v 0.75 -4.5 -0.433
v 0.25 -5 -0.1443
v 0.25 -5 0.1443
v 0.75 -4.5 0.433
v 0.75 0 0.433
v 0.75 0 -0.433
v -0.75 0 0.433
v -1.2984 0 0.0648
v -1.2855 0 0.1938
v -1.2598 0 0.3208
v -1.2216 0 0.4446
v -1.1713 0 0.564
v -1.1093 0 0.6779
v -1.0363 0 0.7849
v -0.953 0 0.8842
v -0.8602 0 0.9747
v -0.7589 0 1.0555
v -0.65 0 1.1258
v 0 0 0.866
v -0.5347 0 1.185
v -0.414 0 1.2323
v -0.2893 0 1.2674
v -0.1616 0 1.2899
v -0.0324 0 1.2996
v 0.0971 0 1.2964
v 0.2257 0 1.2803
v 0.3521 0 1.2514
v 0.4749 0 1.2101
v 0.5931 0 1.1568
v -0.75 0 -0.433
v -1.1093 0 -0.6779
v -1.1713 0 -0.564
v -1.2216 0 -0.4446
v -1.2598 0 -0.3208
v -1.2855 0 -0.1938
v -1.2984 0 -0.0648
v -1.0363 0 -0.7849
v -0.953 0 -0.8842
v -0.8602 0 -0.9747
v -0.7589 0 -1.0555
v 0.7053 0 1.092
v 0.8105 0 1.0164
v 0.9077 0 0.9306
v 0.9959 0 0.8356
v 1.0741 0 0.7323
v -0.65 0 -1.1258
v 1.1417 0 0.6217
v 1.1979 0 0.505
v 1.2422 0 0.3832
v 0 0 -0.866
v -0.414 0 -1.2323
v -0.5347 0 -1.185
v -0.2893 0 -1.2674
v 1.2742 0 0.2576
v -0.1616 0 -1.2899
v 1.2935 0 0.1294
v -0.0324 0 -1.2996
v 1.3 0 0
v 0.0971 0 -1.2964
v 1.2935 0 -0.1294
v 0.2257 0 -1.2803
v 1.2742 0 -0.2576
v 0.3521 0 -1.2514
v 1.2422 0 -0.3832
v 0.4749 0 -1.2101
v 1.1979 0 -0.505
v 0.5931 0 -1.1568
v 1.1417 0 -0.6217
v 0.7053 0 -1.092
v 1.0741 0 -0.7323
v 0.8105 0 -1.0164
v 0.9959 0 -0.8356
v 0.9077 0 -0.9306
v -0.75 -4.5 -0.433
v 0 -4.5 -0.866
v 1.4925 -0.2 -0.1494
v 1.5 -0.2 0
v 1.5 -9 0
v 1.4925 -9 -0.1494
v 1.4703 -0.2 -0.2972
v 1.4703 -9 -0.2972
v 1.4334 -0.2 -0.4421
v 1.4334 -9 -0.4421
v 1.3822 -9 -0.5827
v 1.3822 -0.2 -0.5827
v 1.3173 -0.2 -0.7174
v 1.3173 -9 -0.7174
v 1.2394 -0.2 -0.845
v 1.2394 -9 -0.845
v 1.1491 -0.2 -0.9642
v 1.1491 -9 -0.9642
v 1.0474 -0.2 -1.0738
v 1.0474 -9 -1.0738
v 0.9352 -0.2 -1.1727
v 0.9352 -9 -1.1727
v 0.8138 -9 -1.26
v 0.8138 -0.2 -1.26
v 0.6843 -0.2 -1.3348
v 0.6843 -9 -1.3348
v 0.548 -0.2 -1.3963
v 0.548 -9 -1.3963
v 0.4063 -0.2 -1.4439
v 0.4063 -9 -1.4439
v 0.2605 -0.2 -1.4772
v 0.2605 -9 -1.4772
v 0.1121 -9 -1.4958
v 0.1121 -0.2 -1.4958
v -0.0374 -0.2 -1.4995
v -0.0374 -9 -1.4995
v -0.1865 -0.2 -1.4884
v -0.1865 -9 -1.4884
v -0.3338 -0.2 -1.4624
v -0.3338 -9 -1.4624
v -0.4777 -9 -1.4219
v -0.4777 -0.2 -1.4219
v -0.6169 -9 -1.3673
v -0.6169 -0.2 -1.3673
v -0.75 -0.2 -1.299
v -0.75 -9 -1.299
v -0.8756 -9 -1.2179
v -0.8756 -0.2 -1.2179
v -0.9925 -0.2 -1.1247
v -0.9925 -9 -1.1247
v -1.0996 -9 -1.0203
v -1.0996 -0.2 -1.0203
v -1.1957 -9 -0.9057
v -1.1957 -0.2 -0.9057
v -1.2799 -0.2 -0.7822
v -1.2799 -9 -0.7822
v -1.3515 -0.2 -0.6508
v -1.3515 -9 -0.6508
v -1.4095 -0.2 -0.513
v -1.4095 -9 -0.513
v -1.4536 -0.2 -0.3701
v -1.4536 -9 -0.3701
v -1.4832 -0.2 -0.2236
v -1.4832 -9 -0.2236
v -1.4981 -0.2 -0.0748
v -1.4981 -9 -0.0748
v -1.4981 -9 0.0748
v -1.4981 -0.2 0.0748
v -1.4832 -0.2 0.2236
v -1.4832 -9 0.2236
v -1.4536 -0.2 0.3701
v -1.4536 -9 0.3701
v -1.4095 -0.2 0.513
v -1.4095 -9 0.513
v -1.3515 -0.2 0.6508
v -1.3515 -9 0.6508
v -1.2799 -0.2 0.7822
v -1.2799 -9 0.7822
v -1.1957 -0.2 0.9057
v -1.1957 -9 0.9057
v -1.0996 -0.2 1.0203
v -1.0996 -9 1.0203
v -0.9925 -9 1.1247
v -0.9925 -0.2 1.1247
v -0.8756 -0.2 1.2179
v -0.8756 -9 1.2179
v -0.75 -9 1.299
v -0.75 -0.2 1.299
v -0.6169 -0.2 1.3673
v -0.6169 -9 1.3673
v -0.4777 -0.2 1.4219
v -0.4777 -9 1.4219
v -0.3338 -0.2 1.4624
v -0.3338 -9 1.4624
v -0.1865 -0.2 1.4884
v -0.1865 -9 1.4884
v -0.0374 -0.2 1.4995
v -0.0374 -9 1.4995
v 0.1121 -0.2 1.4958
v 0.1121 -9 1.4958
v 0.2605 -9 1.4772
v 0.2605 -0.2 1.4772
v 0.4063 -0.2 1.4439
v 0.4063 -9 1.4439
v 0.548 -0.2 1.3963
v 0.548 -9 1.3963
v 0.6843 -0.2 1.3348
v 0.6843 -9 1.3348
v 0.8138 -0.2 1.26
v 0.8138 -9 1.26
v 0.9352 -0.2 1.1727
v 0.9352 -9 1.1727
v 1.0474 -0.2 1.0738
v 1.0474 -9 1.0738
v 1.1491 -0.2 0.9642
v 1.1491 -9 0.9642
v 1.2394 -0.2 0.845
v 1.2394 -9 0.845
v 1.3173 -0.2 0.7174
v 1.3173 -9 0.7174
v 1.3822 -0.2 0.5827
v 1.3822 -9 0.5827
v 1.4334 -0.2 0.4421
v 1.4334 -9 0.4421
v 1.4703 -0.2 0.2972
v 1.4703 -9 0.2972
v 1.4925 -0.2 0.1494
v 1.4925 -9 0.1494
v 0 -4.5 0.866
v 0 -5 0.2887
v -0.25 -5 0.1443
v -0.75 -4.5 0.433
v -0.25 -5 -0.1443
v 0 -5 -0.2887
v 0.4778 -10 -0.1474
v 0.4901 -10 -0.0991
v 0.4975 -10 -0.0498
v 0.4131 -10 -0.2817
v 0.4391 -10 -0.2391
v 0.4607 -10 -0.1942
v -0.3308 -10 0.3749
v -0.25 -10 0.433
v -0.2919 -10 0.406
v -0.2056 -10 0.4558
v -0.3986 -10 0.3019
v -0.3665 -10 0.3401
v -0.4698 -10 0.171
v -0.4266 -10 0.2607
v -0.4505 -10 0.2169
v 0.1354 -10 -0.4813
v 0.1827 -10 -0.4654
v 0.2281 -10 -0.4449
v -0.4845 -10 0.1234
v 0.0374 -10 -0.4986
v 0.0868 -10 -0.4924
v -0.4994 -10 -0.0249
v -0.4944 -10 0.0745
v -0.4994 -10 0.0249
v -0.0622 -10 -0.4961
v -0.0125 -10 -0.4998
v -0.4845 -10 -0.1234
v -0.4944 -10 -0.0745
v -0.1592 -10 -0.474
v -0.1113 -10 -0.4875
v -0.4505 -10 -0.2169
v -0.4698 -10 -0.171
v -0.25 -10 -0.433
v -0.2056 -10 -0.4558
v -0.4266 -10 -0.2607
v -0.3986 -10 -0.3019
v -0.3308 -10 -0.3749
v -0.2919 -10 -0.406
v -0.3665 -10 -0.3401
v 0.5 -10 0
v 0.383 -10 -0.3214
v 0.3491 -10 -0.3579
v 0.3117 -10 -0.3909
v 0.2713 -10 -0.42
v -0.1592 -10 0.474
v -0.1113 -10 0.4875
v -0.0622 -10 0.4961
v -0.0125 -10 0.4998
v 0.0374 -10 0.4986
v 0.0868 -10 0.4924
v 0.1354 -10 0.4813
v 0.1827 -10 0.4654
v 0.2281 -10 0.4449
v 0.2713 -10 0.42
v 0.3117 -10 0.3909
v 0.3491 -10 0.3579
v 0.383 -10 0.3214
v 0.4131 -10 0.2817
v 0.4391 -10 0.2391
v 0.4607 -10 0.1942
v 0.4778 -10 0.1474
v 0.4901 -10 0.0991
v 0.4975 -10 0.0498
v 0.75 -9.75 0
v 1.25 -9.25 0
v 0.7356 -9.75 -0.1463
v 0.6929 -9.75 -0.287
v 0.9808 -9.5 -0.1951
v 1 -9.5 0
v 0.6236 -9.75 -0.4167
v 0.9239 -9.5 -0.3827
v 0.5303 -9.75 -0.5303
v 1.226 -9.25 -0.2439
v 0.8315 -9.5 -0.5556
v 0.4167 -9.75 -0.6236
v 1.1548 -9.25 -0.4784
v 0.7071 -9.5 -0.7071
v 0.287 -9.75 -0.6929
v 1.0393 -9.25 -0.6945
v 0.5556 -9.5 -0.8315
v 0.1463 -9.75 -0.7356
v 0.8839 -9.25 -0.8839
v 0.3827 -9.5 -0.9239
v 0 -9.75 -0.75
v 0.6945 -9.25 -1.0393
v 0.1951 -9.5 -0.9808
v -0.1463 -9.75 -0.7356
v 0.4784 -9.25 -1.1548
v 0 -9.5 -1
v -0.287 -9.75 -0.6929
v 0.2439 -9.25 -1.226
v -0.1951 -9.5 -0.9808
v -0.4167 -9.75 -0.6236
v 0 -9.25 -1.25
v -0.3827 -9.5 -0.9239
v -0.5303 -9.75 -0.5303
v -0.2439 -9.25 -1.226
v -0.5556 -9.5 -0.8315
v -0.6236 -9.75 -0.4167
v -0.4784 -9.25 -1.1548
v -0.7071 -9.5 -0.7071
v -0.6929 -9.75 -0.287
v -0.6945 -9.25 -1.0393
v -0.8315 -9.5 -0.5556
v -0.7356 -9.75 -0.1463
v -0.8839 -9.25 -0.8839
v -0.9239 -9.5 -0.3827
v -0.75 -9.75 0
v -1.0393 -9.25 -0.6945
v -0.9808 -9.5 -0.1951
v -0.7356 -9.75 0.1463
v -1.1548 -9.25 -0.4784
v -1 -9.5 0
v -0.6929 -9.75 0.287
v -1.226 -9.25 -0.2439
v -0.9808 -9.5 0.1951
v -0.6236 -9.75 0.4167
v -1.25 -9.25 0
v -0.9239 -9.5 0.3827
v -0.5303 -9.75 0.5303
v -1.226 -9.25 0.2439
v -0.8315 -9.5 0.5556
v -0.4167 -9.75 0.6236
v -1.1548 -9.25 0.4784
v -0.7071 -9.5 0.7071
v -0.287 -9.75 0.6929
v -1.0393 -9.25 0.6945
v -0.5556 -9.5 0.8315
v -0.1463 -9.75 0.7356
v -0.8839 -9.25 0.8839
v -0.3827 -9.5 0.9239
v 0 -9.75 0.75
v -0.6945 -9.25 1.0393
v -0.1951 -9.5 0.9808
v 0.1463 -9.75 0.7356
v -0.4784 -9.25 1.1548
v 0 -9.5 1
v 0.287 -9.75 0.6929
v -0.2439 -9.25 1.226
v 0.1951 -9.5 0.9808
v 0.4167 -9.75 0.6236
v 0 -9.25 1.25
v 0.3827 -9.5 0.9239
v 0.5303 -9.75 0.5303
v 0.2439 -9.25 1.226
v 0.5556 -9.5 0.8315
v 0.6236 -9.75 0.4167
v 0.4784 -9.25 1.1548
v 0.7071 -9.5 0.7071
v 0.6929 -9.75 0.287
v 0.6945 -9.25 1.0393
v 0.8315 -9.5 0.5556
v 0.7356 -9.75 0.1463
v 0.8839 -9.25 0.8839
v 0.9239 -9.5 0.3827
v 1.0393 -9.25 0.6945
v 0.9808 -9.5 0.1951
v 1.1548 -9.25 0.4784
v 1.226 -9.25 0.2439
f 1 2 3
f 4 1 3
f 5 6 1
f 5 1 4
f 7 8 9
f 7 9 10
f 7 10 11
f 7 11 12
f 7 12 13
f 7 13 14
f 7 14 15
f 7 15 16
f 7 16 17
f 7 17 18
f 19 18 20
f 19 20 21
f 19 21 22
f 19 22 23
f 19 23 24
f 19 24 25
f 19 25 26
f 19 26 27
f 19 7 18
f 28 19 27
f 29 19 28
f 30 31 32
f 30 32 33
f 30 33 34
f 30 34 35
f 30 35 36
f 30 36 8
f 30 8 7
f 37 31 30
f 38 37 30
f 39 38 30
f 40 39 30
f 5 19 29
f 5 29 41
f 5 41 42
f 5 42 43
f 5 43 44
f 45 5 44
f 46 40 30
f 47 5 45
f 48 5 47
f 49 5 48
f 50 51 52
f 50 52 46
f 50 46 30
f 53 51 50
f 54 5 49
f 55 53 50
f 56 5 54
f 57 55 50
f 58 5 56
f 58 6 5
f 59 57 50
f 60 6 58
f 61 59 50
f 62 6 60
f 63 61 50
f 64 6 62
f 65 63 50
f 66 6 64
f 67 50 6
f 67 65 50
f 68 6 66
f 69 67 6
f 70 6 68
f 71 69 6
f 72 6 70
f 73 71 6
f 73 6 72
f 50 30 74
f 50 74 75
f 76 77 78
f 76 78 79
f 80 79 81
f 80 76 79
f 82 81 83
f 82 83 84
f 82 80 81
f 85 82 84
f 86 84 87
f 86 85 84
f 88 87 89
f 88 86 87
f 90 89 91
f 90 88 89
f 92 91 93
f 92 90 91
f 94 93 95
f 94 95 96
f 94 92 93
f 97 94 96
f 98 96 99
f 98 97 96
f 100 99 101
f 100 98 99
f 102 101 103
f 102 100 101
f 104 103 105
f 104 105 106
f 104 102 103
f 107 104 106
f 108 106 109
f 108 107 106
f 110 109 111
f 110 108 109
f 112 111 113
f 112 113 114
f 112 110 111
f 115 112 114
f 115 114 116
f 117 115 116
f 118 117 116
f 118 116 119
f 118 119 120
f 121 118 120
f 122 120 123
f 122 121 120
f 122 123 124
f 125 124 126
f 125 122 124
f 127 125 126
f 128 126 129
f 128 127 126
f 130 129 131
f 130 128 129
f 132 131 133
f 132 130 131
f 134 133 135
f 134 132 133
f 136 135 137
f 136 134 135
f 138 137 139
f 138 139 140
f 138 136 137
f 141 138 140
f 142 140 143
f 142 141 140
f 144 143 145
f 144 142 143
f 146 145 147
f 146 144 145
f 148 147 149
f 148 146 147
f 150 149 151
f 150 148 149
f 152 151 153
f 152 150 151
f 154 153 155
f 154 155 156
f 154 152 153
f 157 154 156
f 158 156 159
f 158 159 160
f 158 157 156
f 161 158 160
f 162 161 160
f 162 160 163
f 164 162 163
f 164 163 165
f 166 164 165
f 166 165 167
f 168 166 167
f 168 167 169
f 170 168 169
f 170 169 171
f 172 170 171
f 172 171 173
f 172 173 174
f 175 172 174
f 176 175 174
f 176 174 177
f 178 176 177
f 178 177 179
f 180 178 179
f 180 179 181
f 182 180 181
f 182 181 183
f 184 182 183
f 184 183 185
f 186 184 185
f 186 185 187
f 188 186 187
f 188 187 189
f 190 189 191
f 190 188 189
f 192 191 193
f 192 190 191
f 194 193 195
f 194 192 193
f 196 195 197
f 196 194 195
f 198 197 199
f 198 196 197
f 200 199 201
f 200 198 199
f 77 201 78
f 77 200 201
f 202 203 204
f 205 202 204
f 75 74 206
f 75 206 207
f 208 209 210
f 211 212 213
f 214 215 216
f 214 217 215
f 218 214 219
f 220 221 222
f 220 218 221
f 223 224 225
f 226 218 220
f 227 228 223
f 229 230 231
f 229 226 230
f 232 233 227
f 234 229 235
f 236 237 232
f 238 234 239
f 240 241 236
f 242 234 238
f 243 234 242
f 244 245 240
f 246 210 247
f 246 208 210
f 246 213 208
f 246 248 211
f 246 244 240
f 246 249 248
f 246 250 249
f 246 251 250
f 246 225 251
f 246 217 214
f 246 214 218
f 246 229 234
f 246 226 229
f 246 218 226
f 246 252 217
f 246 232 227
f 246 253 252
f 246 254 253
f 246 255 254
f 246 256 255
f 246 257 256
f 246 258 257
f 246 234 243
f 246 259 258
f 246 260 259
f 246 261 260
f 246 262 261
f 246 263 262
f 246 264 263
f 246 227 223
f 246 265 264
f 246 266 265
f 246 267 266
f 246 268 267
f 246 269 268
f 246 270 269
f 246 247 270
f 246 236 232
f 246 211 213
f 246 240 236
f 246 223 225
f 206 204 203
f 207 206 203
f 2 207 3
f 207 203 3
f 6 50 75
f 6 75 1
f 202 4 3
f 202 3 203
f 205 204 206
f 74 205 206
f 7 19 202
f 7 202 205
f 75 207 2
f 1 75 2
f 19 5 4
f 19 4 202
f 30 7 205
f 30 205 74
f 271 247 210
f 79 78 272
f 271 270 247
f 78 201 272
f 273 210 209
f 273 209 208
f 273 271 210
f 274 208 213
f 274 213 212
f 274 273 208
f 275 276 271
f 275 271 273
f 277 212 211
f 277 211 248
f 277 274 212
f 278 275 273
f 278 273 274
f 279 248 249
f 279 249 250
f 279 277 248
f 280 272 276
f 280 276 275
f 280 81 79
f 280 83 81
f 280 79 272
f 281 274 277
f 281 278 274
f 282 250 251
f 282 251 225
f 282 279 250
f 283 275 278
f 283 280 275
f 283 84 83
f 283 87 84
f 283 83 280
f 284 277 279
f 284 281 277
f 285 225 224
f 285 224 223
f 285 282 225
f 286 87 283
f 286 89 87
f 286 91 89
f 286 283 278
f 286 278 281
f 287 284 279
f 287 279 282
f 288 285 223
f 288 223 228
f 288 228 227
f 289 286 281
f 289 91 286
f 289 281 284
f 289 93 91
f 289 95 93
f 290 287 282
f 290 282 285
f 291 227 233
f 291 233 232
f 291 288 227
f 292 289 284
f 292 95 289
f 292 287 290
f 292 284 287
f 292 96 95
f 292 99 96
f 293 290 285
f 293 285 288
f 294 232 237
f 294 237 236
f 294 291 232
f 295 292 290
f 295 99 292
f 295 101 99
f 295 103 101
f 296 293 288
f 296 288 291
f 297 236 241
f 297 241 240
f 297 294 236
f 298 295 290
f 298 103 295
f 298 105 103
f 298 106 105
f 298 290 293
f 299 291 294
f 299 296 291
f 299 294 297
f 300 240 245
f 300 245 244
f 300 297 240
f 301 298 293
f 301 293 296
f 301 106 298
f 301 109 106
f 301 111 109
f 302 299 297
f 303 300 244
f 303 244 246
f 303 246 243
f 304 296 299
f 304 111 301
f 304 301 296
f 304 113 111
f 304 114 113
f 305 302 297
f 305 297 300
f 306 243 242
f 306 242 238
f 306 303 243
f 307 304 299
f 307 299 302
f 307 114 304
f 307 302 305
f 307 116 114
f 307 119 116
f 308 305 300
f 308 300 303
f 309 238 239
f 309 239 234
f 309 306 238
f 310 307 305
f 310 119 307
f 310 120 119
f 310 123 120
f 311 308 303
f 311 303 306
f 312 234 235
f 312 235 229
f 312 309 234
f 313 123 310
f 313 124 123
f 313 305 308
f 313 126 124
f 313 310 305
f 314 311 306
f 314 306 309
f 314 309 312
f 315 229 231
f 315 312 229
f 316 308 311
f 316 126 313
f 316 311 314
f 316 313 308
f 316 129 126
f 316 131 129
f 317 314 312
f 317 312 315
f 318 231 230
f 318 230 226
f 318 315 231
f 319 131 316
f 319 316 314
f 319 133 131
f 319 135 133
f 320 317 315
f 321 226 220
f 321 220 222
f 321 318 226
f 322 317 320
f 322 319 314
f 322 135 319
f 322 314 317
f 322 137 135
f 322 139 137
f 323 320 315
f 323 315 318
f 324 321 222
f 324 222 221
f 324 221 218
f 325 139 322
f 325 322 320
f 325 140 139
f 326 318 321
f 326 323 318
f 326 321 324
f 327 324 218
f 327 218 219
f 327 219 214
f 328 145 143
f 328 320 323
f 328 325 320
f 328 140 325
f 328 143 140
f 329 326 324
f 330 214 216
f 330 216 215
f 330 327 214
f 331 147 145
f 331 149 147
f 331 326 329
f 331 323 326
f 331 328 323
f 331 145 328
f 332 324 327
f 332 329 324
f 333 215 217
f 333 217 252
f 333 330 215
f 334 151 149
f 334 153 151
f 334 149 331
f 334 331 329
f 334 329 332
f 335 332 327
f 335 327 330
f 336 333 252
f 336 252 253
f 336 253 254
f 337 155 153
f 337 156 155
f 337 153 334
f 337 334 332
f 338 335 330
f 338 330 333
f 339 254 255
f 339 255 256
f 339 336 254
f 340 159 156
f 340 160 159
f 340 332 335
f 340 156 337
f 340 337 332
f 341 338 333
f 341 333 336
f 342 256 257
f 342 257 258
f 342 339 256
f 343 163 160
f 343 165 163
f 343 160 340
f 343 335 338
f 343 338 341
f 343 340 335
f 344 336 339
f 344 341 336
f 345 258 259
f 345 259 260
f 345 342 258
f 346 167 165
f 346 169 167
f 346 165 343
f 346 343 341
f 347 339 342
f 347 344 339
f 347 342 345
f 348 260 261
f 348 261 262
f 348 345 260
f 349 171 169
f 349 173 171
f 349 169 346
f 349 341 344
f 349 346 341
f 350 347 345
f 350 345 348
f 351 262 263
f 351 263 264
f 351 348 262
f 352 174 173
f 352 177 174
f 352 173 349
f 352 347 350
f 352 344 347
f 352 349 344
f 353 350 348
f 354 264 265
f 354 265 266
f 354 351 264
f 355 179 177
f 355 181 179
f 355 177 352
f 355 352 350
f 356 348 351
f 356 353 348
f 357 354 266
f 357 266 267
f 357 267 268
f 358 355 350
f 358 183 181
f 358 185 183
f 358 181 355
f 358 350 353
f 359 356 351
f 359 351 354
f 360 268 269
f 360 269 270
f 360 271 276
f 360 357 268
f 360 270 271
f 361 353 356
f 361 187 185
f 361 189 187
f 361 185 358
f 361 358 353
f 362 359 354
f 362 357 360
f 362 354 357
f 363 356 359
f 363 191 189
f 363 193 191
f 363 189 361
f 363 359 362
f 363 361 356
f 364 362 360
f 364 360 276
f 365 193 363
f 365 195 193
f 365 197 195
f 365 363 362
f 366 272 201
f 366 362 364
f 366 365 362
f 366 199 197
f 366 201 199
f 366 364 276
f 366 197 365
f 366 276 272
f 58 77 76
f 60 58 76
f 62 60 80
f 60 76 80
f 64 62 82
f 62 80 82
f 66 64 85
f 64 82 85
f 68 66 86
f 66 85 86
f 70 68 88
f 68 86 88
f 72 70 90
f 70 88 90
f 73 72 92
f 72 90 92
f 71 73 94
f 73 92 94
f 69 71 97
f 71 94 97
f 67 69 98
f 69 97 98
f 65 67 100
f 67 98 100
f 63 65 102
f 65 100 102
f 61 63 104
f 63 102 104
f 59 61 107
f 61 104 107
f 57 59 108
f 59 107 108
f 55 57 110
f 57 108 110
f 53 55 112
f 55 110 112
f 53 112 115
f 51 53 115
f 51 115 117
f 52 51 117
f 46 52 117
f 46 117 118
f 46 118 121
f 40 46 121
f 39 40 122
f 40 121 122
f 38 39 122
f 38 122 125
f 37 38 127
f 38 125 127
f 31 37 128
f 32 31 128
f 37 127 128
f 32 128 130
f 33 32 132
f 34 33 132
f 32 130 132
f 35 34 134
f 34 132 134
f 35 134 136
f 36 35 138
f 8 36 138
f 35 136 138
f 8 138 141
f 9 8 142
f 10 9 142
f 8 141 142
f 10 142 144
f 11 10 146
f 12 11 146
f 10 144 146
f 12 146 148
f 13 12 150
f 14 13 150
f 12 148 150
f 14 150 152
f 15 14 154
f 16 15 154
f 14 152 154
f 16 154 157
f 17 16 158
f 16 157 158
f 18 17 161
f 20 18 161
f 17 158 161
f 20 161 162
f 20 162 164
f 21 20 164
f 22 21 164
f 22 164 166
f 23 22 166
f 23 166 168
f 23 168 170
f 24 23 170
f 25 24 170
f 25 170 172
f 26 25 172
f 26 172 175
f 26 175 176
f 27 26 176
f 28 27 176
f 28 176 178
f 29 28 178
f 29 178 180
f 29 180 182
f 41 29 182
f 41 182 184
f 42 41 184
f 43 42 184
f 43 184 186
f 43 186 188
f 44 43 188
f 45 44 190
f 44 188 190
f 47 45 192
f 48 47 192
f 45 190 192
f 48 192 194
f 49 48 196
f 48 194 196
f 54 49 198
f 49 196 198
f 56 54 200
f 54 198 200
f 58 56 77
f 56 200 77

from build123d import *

# Parameters (mm, degrees)
POCKET_DEPTH    = 5
CHAMFER_SIZE    = 0.5
CHAMFER001_SIZE = 0.2


with BuildPart() as part:
    # Sketch → Revolution (revolve)
    with BuildSketch(Plane.XY):
        Polygon((0.5, -10), (1.5, -9), (1.5, 0), (0, 0), (0, -10), align=None)
    revolve(axis=Axis((0, 0, 0), (0, 1, 0)))

    # Sketch001 → Pocket (cut)
    with BuildSketch(Plane.XZ):
        Polygon((0.75, -0.433013), (0.75, 0.433013), (0, 0.866025), (-0.75, 0.433013), (-0.75, -0.433013), (0, -0.866025), align=None)
    extrude(amount=POCKET_DEPTH, mode=Mode.SUBTRACT)

    # Chamfer
    chamfer_edges = [part.edges().sort_by_distance(p)[0] for p in [
        (0.75, -5, 0),
        (0.375, -5, 0.649519),
        (-0.375, -5, 0.649519),
        (-0.75, -5, 0),
        (-0.375, -5, -0.649519),
        (0.375, -5, -0.649519),
    ]]
    chamfer(chamfer_edges, length=CHAMFER_SIZE)

    # Chamfer001
    chamfer001_edges = [part.edges().sort_by_distance(p)[0] for p in [
        (-1.5, 0, 0),
    ]]
    chamfer(chamfer001_edges, length=CHAMFER001_SIZE)


solid = part.part
